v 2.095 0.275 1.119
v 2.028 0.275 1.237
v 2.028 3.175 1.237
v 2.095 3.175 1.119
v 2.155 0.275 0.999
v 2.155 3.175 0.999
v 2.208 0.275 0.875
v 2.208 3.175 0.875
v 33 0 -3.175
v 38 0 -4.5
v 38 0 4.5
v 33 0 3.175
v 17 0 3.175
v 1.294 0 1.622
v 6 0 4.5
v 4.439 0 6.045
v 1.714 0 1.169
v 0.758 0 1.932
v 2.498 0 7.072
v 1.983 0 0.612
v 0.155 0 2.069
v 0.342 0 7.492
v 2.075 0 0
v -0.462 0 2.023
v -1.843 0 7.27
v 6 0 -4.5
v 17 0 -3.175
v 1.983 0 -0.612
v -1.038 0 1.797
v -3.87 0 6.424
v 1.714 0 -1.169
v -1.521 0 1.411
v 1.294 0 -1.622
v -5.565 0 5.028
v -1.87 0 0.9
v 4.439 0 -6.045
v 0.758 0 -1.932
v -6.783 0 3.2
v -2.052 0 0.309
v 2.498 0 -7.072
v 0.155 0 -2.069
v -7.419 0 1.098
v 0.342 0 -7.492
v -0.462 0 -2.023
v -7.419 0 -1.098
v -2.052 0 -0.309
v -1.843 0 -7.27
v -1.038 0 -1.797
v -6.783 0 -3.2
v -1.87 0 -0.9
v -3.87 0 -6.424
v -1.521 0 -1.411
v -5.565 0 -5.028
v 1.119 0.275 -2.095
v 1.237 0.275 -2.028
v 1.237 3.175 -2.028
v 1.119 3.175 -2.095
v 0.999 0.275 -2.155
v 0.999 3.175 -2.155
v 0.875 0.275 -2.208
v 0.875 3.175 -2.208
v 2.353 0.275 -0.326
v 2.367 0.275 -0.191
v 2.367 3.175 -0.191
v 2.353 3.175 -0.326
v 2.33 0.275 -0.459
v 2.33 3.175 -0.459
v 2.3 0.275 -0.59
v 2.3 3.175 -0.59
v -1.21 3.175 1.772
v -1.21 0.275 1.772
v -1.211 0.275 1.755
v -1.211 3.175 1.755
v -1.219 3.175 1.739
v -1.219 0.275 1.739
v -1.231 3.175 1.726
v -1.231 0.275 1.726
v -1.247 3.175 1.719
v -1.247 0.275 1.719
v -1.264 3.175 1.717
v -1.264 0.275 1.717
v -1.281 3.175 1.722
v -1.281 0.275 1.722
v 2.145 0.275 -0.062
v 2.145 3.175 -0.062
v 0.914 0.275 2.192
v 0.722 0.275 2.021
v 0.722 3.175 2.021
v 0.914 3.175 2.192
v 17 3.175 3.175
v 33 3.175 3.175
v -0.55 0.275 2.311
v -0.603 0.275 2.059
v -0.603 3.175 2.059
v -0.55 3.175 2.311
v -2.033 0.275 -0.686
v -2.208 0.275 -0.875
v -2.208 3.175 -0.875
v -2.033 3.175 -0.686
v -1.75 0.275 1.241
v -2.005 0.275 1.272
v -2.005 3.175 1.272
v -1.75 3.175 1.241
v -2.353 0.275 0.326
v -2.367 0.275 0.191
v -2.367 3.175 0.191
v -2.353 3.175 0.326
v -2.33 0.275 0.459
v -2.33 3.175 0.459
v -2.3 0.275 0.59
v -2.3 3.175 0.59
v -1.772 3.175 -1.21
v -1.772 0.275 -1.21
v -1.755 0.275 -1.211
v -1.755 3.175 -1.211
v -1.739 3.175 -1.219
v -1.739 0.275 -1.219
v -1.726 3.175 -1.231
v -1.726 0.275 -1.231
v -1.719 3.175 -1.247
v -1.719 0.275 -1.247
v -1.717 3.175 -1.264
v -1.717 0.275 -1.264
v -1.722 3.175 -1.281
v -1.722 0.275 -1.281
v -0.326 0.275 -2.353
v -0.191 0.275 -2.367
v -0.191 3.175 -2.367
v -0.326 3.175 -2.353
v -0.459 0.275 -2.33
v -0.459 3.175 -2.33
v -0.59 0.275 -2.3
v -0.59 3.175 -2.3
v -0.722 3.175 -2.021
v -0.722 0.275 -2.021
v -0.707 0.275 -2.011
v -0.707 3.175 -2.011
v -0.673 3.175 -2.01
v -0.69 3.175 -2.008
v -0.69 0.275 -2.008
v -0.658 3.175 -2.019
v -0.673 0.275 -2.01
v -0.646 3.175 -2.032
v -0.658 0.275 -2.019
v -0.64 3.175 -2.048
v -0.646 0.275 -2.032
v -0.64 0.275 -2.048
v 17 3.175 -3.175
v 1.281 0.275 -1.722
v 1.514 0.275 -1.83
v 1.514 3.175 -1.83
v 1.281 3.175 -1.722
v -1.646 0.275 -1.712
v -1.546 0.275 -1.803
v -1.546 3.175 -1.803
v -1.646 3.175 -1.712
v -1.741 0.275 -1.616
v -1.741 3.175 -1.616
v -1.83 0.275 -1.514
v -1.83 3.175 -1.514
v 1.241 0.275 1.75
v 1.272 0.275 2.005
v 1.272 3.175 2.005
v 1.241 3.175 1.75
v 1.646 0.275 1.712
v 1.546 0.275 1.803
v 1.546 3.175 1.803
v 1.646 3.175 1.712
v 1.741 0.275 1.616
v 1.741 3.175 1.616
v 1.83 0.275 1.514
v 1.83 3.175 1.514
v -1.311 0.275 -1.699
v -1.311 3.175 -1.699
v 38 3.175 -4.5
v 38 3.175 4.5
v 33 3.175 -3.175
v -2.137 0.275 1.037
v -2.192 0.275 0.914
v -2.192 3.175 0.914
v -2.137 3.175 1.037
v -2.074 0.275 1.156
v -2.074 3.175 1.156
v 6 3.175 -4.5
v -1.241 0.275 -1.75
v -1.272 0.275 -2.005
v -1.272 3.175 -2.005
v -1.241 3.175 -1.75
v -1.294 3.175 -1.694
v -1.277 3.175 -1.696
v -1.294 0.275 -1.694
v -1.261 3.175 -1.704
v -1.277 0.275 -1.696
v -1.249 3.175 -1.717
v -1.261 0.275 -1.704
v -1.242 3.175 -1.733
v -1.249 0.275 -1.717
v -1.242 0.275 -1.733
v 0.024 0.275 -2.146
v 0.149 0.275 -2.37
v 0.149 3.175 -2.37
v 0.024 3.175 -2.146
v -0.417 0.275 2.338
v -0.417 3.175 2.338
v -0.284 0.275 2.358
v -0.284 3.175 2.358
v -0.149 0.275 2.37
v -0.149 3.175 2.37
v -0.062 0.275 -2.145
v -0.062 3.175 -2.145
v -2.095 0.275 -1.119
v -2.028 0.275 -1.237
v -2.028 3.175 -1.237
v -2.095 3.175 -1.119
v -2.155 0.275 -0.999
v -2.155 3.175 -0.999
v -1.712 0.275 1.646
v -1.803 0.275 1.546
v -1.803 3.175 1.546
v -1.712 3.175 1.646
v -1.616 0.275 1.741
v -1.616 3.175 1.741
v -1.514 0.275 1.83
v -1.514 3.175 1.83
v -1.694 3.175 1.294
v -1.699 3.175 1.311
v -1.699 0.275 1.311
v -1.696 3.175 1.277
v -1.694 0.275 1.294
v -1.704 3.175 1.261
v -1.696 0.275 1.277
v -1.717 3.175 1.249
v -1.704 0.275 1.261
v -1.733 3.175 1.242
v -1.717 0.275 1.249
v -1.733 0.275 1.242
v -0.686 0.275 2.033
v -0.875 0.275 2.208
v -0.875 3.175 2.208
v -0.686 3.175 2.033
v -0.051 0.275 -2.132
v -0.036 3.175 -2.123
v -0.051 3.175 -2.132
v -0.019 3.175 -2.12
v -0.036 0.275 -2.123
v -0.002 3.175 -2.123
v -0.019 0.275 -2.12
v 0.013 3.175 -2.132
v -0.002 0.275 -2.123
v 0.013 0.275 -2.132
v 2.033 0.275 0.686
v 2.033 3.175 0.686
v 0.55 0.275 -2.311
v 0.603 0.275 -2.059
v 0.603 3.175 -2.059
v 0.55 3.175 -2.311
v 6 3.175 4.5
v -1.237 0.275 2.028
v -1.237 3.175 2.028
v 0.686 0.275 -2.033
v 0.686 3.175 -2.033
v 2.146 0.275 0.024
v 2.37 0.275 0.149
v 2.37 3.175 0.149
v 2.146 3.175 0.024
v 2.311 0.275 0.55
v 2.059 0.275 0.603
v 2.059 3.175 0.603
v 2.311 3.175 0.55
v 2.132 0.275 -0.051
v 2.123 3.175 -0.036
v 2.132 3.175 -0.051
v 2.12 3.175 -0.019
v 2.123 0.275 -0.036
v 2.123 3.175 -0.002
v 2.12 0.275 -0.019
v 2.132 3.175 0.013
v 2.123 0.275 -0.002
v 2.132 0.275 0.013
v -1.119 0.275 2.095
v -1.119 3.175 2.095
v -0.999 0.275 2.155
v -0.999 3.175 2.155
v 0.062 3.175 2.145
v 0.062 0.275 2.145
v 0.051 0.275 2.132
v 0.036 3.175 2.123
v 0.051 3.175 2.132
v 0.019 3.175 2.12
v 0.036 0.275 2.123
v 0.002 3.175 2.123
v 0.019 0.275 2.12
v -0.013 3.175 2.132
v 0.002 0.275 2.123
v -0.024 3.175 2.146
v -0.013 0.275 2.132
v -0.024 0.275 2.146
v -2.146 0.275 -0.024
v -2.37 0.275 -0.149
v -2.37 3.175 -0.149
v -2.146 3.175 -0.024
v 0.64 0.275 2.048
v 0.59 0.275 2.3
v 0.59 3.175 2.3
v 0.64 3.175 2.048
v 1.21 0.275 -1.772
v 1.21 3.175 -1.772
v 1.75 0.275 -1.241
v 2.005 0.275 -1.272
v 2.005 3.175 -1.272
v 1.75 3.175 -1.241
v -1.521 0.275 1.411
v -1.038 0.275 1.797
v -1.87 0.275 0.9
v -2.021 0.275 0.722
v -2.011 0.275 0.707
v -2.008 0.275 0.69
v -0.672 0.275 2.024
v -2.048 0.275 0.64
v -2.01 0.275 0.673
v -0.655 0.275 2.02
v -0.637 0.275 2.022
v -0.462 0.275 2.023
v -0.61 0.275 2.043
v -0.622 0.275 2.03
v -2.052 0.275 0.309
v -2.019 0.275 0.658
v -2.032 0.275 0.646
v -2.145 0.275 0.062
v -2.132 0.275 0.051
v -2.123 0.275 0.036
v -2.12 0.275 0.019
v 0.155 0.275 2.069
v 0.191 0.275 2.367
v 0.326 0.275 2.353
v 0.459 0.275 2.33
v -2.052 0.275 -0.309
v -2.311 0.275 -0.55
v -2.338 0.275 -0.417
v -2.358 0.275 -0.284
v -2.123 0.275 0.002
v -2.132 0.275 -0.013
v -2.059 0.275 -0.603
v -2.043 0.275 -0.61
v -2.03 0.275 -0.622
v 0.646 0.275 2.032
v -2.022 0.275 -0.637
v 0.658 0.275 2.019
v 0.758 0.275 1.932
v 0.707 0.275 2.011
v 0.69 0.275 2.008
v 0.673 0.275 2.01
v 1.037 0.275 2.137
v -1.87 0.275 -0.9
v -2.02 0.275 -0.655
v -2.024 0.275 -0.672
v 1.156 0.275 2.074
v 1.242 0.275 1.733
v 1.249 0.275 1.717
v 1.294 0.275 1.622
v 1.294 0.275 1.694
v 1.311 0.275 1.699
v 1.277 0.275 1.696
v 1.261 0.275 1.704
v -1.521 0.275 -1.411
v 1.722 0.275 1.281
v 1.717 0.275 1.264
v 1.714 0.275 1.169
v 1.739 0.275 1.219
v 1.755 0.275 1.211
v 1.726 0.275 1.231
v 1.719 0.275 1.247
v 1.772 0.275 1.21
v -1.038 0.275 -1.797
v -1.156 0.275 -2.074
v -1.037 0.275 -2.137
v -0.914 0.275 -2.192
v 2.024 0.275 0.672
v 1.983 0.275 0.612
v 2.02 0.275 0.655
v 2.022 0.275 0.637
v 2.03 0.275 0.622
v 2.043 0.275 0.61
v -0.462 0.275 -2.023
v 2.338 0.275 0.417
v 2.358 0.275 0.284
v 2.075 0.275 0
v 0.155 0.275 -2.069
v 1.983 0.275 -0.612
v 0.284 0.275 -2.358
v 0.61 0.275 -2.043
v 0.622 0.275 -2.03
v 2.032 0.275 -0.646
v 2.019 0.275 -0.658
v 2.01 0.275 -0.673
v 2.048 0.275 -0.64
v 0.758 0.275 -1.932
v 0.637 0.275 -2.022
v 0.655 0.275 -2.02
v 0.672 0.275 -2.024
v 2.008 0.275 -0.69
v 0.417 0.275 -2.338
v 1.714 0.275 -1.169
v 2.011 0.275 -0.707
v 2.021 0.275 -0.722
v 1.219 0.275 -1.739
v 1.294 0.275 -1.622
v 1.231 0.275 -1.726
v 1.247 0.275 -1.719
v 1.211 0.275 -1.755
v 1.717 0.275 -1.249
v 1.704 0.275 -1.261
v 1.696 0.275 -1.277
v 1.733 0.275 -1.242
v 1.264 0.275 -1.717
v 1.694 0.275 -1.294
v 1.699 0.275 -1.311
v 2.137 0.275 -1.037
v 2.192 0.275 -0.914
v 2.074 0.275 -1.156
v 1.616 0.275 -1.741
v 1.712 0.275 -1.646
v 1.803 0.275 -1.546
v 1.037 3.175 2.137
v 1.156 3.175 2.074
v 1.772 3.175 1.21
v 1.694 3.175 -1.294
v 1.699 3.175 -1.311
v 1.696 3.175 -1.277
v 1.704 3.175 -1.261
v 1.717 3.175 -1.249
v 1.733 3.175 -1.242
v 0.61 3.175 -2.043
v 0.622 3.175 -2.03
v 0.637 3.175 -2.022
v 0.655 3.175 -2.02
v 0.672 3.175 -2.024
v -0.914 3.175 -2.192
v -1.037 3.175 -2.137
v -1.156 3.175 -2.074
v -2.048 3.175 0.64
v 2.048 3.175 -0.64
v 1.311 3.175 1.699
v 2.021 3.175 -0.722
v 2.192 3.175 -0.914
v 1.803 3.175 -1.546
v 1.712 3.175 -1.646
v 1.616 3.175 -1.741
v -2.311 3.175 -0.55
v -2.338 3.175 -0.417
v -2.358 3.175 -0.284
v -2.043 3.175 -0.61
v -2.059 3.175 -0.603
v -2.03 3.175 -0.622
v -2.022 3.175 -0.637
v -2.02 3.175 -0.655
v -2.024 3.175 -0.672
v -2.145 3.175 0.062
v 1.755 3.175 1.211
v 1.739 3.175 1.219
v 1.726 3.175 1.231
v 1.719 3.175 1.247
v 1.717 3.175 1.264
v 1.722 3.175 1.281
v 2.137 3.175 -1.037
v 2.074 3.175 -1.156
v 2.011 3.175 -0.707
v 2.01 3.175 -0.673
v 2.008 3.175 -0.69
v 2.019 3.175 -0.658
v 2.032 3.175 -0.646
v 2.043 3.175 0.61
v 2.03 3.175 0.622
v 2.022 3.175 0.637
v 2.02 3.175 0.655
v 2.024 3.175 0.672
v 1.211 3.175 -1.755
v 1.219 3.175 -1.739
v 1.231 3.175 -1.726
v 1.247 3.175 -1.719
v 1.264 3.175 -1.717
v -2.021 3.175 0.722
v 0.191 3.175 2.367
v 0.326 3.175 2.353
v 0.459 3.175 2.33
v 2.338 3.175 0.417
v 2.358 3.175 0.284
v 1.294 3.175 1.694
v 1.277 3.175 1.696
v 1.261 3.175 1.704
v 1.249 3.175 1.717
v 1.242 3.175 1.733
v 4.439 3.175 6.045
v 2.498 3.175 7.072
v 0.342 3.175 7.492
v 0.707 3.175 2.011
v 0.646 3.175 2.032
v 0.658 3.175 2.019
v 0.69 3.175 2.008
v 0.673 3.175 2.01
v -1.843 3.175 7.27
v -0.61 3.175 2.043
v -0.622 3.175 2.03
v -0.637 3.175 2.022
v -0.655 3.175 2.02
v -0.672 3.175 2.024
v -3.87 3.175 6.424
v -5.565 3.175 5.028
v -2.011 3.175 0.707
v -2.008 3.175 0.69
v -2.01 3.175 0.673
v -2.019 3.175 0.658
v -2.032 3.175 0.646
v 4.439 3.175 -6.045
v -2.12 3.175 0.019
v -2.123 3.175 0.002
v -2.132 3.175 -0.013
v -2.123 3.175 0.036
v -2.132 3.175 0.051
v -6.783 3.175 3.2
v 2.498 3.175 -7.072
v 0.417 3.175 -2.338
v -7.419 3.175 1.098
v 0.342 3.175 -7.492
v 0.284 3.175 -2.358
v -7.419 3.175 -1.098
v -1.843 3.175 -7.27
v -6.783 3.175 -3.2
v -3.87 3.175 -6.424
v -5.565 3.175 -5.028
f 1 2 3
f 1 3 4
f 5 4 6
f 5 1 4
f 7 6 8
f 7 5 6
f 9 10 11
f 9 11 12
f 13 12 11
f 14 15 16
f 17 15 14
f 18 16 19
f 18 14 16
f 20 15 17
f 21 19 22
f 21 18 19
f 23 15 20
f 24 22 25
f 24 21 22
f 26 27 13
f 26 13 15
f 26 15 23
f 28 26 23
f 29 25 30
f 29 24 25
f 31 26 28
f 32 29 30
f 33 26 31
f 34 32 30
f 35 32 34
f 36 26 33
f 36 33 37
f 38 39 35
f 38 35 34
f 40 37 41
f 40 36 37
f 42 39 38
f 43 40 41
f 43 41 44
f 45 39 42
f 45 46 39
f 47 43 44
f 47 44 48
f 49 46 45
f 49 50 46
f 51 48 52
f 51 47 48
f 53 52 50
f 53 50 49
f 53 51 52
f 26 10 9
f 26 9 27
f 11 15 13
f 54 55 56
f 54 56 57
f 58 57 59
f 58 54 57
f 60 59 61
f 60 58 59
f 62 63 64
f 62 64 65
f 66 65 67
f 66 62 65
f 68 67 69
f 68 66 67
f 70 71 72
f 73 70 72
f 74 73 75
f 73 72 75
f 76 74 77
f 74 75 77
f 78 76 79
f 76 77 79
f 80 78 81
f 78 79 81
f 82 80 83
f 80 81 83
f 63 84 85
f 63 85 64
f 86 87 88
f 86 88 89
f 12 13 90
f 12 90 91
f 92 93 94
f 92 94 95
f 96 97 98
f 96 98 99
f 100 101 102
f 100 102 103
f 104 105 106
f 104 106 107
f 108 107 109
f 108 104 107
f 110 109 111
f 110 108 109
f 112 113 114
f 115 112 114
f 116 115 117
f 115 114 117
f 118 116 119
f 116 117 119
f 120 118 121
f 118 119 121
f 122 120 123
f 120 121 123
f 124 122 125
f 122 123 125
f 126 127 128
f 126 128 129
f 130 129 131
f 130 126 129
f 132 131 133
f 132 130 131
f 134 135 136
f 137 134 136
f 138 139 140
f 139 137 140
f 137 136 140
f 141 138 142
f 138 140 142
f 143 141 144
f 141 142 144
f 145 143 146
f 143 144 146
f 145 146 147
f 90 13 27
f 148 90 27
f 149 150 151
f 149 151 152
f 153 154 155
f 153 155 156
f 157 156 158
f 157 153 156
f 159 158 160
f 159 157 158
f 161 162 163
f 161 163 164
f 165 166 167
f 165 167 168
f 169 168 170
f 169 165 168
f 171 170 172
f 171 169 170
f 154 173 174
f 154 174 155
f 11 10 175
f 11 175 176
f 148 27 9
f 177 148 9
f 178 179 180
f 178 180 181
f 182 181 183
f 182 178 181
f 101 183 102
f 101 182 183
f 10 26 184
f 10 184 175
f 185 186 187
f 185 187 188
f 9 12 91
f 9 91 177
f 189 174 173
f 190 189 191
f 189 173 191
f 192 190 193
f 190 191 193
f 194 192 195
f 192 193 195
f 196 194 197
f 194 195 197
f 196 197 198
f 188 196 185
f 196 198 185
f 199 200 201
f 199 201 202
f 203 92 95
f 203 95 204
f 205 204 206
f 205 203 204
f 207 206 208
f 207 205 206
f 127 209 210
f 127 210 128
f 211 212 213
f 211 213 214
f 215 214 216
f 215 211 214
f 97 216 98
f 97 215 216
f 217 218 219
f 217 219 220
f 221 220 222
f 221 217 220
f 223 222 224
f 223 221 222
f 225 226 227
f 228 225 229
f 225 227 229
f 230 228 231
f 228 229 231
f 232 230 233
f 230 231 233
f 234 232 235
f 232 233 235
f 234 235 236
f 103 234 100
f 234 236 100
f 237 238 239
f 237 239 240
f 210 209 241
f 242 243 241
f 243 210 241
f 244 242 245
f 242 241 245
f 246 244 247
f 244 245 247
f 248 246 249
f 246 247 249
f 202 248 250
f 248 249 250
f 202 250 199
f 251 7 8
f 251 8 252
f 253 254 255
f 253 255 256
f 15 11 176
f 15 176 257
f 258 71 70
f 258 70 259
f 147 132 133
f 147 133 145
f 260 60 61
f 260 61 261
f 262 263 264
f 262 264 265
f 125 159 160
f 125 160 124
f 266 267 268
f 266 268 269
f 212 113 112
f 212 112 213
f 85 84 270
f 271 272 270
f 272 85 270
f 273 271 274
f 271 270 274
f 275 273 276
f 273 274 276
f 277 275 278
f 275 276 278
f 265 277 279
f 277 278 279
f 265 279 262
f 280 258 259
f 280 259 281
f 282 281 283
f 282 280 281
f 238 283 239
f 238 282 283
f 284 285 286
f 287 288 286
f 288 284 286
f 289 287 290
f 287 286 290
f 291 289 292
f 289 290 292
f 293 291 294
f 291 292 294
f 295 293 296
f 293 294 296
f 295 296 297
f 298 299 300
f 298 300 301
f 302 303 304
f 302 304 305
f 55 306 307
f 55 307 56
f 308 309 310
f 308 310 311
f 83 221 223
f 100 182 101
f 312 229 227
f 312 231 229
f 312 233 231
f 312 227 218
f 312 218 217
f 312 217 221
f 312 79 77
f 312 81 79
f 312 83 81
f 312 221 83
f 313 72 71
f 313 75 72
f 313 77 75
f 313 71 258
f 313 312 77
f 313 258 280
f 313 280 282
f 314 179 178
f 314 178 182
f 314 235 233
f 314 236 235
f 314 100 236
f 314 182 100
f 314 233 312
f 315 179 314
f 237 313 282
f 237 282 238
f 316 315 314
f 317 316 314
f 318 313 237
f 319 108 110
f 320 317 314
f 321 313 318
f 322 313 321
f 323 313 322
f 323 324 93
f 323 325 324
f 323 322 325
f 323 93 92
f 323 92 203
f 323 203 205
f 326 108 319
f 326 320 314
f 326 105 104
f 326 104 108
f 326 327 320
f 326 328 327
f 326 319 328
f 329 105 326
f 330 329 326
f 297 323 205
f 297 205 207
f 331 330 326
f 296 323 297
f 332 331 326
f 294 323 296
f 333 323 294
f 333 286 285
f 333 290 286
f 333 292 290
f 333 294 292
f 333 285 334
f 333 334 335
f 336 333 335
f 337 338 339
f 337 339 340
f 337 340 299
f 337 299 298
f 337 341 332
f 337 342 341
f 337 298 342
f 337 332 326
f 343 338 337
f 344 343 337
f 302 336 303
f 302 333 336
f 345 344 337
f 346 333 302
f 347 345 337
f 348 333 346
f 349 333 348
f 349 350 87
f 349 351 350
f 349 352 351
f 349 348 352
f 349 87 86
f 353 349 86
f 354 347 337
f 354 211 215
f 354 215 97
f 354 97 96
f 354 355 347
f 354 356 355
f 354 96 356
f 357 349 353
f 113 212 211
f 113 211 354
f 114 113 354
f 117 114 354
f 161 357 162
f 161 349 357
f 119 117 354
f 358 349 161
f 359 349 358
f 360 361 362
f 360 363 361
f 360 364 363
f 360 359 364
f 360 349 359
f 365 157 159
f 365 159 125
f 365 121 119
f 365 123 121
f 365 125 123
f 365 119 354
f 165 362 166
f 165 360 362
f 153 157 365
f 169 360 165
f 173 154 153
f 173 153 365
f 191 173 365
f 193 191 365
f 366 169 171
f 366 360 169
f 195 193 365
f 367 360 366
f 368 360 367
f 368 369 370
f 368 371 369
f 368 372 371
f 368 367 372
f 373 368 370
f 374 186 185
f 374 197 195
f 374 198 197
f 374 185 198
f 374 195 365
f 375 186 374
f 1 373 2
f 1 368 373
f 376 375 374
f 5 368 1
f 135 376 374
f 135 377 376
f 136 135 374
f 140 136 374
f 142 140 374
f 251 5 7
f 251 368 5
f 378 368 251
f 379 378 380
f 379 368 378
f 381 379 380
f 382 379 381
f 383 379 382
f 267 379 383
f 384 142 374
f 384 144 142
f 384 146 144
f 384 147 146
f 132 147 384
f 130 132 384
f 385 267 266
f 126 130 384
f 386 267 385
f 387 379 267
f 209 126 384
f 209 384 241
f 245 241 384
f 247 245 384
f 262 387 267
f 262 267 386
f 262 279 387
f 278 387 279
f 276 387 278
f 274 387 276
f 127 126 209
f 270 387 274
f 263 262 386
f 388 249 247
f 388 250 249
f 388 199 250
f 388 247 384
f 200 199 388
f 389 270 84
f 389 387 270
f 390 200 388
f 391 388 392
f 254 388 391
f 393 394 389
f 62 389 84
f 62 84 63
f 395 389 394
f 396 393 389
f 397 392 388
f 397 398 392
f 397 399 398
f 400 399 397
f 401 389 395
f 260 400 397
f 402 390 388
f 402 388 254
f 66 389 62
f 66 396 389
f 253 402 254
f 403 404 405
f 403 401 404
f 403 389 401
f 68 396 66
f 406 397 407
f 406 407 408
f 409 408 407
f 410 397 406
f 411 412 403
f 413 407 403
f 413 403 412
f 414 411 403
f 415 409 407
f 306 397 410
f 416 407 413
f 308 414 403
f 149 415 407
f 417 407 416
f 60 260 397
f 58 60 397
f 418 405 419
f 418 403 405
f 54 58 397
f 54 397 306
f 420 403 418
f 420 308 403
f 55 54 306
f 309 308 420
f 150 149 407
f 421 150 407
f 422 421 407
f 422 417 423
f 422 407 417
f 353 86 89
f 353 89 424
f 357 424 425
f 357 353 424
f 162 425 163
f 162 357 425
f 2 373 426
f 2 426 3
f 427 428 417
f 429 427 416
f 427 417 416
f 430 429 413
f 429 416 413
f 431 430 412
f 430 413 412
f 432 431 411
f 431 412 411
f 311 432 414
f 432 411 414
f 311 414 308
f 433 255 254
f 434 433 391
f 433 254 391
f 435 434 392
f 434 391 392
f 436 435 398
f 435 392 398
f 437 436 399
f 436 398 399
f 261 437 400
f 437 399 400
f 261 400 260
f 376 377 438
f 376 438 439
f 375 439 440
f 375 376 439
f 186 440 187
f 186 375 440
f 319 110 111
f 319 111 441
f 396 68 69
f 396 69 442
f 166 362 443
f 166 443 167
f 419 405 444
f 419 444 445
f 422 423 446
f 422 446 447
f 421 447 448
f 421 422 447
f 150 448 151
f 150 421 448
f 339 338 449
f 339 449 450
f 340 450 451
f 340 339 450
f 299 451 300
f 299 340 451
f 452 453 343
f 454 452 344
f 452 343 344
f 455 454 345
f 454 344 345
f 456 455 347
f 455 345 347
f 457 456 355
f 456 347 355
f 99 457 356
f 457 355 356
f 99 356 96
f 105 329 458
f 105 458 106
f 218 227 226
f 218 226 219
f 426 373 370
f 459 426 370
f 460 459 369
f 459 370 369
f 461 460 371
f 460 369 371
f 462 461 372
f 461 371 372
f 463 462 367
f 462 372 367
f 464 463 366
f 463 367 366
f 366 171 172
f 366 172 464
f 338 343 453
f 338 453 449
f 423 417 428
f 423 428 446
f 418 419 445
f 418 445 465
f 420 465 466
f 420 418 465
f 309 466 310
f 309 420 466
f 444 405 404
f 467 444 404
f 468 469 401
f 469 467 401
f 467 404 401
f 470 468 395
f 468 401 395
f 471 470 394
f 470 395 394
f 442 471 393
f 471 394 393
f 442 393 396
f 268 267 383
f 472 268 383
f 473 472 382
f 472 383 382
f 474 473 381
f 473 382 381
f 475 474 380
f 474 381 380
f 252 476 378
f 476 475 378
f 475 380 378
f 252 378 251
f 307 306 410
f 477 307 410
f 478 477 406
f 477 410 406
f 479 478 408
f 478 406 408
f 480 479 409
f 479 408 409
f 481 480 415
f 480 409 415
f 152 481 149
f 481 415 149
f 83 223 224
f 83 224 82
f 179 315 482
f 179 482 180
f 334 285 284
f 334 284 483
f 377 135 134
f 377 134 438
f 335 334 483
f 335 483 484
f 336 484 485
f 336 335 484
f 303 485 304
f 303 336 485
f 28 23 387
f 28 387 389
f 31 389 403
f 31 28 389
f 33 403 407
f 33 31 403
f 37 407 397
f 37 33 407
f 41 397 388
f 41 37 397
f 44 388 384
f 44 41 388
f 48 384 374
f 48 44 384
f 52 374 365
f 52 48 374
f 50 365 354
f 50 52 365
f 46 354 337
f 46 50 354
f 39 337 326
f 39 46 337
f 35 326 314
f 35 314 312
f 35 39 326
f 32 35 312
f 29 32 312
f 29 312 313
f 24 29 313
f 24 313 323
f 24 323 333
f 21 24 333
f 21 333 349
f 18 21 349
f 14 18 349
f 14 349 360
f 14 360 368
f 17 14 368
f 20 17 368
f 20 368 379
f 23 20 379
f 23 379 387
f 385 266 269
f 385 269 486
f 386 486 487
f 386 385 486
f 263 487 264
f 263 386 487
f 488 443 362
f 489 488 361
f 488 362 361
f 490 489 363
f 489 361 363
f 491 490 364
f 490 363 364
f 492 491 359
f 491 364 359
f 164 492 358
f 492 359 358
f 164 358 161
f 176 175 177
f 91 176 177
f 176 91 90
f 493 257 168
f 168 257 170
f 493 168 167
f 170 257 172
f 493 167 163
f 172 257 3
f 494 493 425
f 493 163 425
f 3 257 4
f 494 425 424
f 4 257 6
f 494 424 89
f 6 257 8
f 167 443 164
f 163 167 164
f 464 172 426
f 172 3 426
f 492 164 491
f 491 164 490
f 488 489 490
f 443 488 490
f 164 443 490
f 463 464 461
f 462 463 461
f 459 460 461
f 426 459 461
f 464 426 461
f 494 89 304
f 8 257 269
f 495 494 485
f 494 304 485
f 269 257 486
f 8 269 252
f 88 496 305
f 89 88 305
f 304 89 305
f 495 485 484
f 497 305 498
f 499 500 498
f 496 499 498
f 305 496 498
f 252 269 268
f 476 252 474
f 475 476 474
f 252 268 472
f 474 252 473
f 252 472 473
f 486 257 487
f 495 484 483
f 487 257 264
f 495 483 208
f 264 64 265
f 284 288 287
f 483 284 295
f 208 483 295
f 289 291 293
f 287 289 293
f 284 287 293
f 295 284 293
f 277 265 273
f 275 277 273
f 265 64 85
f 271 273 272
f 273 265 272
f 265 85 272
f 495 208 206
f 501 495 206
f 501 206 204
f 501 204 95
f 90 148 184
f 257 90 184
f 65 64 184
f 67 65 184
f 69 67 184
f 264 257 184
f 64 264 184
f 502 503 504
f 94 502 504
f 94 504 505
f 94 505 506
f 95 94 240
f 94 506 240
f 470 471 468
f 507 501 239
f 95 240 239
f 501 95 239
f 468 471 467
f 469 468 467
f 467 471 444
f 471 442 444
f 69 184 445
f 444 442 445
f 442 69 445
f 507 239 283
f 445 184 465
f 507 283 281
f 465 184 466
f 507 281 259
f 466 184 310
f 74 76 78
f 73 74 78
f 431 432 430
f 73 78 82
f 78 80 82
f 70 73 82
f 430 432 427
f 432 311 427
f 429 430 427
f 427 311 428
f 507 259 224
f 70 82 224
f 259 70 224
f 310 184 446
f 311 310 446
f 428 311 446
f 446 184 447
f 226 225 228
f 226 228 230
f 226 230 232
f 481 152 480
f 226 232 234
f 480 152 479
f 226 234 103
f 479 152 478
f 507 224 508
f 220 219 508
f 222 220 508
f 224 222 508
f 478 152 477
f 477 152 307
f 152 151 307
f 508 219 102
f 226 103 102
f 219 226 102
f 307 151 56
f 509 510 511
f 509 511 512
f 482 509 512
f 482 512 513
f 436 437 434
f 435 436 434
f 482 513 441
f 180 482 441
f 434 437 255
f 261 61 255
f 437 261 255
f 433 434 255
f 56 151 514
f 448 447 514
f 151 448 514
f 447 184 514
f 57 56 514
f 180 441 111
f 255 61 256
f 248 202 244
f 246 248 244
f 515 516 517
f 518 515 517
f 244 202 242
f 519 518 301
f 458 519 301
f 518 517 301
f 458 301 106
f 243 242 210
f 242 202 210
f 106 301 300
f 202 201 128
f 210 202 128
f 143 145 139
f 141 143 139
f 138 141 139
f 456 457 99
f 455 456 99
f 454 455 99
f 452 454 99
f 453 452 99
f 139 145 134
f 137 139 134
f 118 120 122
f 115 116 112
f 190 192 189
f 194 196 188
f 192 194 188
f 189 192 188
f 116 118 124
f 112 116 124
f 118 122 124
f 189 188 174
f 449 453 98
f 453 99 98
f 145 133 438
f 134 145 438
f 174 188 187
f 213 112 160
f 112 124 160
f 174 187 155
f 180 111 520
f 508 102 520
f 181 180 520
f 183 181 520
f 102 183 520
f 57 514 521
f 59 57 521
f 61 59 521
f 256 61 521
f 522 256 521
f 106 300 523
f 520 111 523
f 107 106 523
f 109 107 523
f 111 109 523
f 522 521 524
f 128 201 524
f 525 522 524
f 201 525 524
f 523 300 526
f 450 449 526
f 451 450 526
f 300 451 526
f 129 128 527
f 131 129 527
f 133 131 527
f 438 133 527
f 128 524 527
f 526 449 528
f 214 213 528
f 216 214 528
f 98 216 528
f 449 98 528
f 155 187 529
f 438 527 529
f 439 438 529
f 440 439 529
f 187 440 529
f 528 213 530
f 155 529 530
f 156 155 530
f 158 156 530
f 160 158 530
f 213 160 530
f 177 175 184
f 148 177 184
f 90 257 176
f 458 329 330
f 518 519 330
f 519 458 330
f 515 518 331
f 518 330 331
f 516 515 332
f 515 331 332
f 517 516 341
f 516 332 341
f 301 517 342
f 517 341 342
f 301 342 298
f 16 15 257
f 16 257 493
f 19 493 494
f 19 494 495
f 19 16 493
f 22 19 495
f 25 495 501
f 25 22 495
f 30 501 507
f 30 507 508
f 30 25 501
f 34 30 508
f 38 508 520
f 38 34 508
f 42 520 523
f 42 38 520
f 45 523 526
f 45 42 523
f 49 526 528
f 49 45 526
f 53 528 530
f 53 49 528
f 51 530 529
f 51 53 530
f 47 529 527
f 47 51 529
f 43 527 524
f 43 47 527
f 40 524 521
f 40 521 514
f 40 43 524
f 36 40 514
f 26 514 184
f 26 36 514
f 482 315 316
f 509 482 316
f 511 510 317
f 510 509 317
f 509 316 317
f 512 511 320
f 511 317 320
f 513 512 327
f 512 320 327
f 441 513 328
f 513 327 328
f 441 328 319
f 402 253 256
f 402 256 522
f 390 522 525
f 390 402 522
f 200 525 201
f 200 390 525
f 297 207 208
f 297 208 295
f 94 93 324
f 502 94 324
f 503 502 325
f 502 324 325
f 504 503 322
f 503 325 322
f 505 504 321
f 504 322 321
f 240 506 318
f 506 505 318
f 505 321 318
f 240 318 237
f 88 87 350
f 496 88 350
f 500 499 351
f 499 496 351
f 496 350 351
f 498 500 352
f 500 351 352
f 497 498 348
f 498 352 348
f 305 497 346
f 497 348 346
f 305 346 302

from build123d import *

# Parameters (mm, degrees)
SKETCH1_R             = 2
SKETCH1_W             = 16
SKETCH1_H             = 6.35
BOSS_EXTRUDE1_DEPTH   = 3.175
INDENT2_START         = 0.275
INDENT2_OUTLINE_R     = 2
INDENT2_DEPTH         = 2.9
INDENT2_2_OUTLINE_R   = 2.075
INDENT2_2_OUTLINE_R_2 = 2
INDENT2_2_DEPTH       = 0.275
FILLET4_R             = 0.05


# Read off the part's stored shape, not the designer's step: Indent2
with BuildPart() as part:
    # Sketch1 → Boss-Extrude1 (new body)
    with BuildSketch(Plane(origin=(0, 0, 0), x_dir=(1, 0, 0), z_dir=(0, 1, 0))):
        with BuildLine():
            Line((6, 4.5), (38, 4.5))
            Line((38, 4.5), (38, -4.5))
            Line((38, -4.5), (6, -4.5))
            ThreePointArc((6, -4.5), (-7.5, 0), (6, 4.5))
        make_face()
        with Locations(Location((0, 0, 0), (0, 0, 270))):
            Circle(SKETCH1_R, mode=Mode.SUBTRACT)
        with Locations((25, 0)):
            Rectangle(SKETCH1_W, SKETCH1_H, mode=Mode.SUBTRACT)
    extrude(amount=BOSS_EXTRUDE1_DEPTH)

    # Indent2 outline → Indent2 (cut)
    with BuildSketch(Plane(origin=(0, 0, 0), x_dir=(1, 0, 0), z_dir=(0, 1, 0)).offset(INDENT2_START)):
        with BuildLine():
            Line((1.973202198, -0.621873827), (2.310555802, -0.549506038))
            ThreePointArc((2.310555802, -0.549506038), (2.348957068, -0.350750187), (2.370293408, -0.149446173))
            Line((2.370293408, -0.149446173), (2.068796389, 0.018315857))
            Line((2.068796389, 0.018315857), (2.367275856, 0.191389711))
            ThreePointArc((2.367275856, 0.191389711), (2.342378694, 0.392284402), (2.300464399, 0.590329188))
            Line((2.300464399, 0.590329188), (1.961882375, 0.656712657))
            Line((1.961882375, 0.656712657), (2.192270455, 0.913550902))
            ThreePointArc((2.192270455, 0.913550902), (2.106511974, 1.096919461), (2.005449906, 1.272319015))
            Line((2.005449906, 1.272319015), (1.662925646, 1.230825847))
            Line((1.662925646, 1.230825847), (1.802670348, 1.546287365))
            ThreePointArc((1.802670348, 1.546287365), (1.664445185, 1.6941804), (1.514128003, 1.829765392))
            Line((1.514128003, 1.829765392), (1.201190168, 1.684457227))
            Line((1.201190168, 1.684457227), (1.236612307, 2.027662448))
            ThreePointArc((1.236612307, 2.027662448), (1.059450904, 2.125603157), (0.874592702, 2.208101584))
            Line((0.874592702, 2.208101584), (0.621873827, 1.973202197))
            Line((0.621873827, 1.973202197), (0.549506038, 2.310555802))
            ThreePointArc((0.549506038, 2.310555802), (0.350750187, 2.348957068), (0.149446173, 2.370293408))
            Line((0.149446173, 2.370293408), (-0.018315857, 2.068796389))
            Line((-0.018315857, 2.068796389), (-0.191389711, 2.367275856))
            ThreePointArc((-0.191389711, 2.367275856), (-0.392284402, 2.342378694), (-0.590329188, 2.300464399))
            Line((-0.590329188, 2.300464399), (-0.656712657, 1.961882375))
            Line((-0.656712657, 1.961882375), (-0.913550902, 2.192270455))
            ThreePointArc((-0.913550902, 2.192270455), (-1.096919461, 2.106511974), (-1.272319015, 2.005449905))
            Line((-1.272319015, 2.005449905), (-1.230825847, 1.662925646))
            Line((-1.230825847, 1.662925646), (-1.546287365, 1.802670348))
            ThreePointArc((-1.546287365, 1.802670348), (-1.6941804, 1.664445185), (-1.829765392, 1.514128003))
            Line((-1.829765392, 1.514128003), (-1.684457227, 1.201190168))
            Line((-1.684457227, 1.201190168), (-2.027662448, 1.236612307))
            ThreePointArc((-2.027662448, 1.236612307), (-2.125603157, 1.059450904), (-2.208101584, 0.874592702))
            Line((-2.208101584, 0.874592702), (-1.973202197, 0.621873827))
            Line((-1.973202197, 0.621873827), (-2.310555802, 0.549506038))
            ThreePointArc((-2.310555802, 0.549506038), (-2.348957068, 0.350750187), (-2.370293408, 0.149446173))
            Line((-2.370293408, 0.149446173), (-2.068796389, -0.018315857))
            Line((-2.068796389, -0.018315857), (-2.367275856, -0.191389711))
            ThreePointArc((-2.367275856, -0.191389711), (-2.342378694, -0.392284402), (-2.300464399, -0.590329188))
            Line((-2.300464399, -0.590329188), (-1.961882375, -0.656712657))
            Line((-1.961882375, -0.656712657), (-2.192270455, -0.913550902))
            ThreePointArc((-2.192270455, -0.913550902), (-2.106511974, -1.096919461), (-2.005449905, -1.272319015))
            Line((-2.005449905, -1.272319015), (-1.662925646, -1.230825847))
            Line((-1.662925646, -1.230825847), (-1.802670348, -1.546287365))
            ThreePointArc((-1.802670348, -1.546287365), (-1.664445185, -1.6941804), (-1.514128003, -1.829765392))
            Line((-1.514128003, -1.829765392), (-1.201190168, -1.684457227))
            Line((-1.201190168, -1.684457227), (-1.236612307, -2.027662448))
            ThreePointArc((-1.236612307, -2.027662448), (-1.059450904, -2.125603157), (-0.874592702, -2.208101584))
            Line((-0.874592702, -2.208101584), (-0.621873827, -1.973202198))
            Line((-0.621873827, -1.973202198), (-0.549506038, -2.310555802))
            ThreePointArc((-0.549506038, -2.310555802), (-0.350750187, -2.348957068), (-0.149446173, -2.370293408))
            Line((-0.149446173, -2.370293408), (0.018315857, -2.068796389))
            Line((0.018315857, -2.068796389), (0.191389711, -2.367275856))
            ThreePointArc((0.191389711, -2.367275856), (0.392284402, -2.342378694), (0.590329188, -2.300464399))
            Line((0.590329188, -2.300464399), (0.656712657, -1.961882375))
            Line((0.656712657, -1.961882375), (0.913550902, -2.192270455))
            ThreePointArc((0.913550902, -2.192270455), (1.096919461, -2.106511974), (1.272319015, -2.005449906))
            Line((1.272319015, -2.005449906), (1.230825847, -1.662925646))
            Line((1.230825847, -1.662925646), (1.546287365, -1.802670348))
            ThreePointArc((1.546287365, -1.802670348), (1.6941804, -1.664445185), (1.829765392, -1.514128003))
            Line((1.829765392, -1.514128003), (1.684457227, -1.201190168))
            Line((1.684457227, -1.201190168), (2.027662448, -1.236612307))
            ThreePointArc((2.027662448, -1.236612307), (2.125603157, -1.059450904), (2.208101584, -0.874592702))
            Line((2.208101584, -0.874592702), (1.973202198, -0.621873827))
        make_face()
        Circle(INDENT2_OUTLINE_R, mode=Mode.SUBTRACT)
    extrude(amount=INDENT2_DEPTH, mode=Mode.SUBTRACT)

    # Indent2 2 outline → Indent2 2 (cut)
    with BuildSketch(Plane(origin=(0, 0, 0), x_dir=(1, 0, 0), z_dir=(0, 1, 0))):
        Circle(INDENT2_2_OUTLINE_R)
        Circle(INDENT2_2_OUTLINE_R_2, mode=Mode.SUBTRACT)
    extrude(amount=INDENT2_2_DEPTH, mode=Mode.SUBTRACT)

    # Fillet4
    # the kernel refuses this fillet: 0.05 mm, written as the material it takes off along each edge
    with BuildSketch(Plane(origin=(2.068796389, 0.275, -0.018315857), x_dir=(0.8650868282896619, 0, -0.501622148155096), z_dir=(0, 1, 0)), Plane(origin=(1.961882375, 0.275, -0.656712657), x_dir=(0.6677366959947866, 0, -0.7443975448790559), z_dir=(0, 1, 0)), Plane(origin=(0.621873827, 0.275, -1.973202197), x_dir=(-0.20974448107145283, 0, -0.9777562337618038), z_dir=(0, 1, 0)), Plane(origin=(-0.018315857, 0.275, -2.068796389), x_dir=(-0.501622148155096, 0, -0.8650868282896619), z_dir=(0, 1, 0)), Plane(origin=(-0.656712657, 0.275, -1.961882375), x_dir=(-0.7443975448790559, 0, -0.6677366959947866), z_dir=(0, 1, 0)), Plane(origin=(-1.973202197, 0.275, -0.621873827), x_dir=(-0.9777562337618038, 0, 0.20974448107145283), z_dir=(0, 1, 0)), Plane(origin=(-2.068796389, 0.275, 0.018315857), x_dir=(-0.8650868282896619, 0, 0.501622148155096), z_dir=(0, 1, 0)), Plane(origin=(-1.961882375, 0.275, 0.656712657), x_dir=(-0.6677366959947866, 0, 0.7443975448790559), z_dir=(0, 1, 0)), Plane(origin=(0.018315857, 0.275, 2.068796389), x_dir=(0.501622148155096, 0, 0.8650868282896619), z_dir=(0, 1, 0)), Plane(origin=(0.656712657, 0.275, 1.961882375), x_dir=(0.7443975448790559, 0, 0.6677366959947866), z_dir=(0, 1, 0))) as fillet4_piece_1:
        with BuildLine():
            CenterArc((FILLET4_R * 1.76030903483, -FILLET4_R), FILLET4_R, 90, 120.799739684)
            Line((FILLET4_R * 0.901346811508, -FILLET4_R * 1.51203896229), (0, 0))
            Line((0, 0), (FILLET4_R * 1.76030903483, 0))
        make_face()
    extrude(amount=3.120038629, mode=Mode.SUBTRACT)
    with BuildSketch(Plane(origin=(1.662925646, 0.275, -1.230825847), x_dir=(0.40502384395389723, 0, -0.9143061226027139), z_dir=(0, 1, 0)), Plane(origin=(-1.230825847, 0.275, -1.662925646), x_dir=(-0.9143061226027142, 0, -0.40502384395389696), z_dir=(0, 1, 0)), Plane(origin=(-1.662925646, 0.275, 1.230825847), x_dir=(-0.40502384395389696, 0, 0.9143061226027142), z_dir=(0, 1, 0)), Plane(origin=(-0.621873827, 0.275, 1.973202198), x_dir=(0.20974448166583565, 0, 0.977756233634299), z_dir=(0, 1, 0)), Plane(origin=(1.230825847, 0.275, 1.662925646), x_dir=(0.9143061226027139, 0, 0.40502384395389723), z_dir=(0, 1, 0)), Plane(origin=(1.973202198, 0.275, 0.621873827), x_dir=(0.977756233634299, 0, -0.20974448166583565), z_dir=(0, 1, 0))) as fillet4_piece_2:
        with BuildLine():
            CenterArc((FILLET4_R * 1.76030903185, -FILLET4_R), FILLET4_R, 90, 120.799739601)
            Line((FILLET4_R * 0.901346807787, -FILLET4_R * 1.51203896104), (0, 0))
            Line((0, 0), (FILLET4_R * 1.76030903185, 0))
        make_face()
    extrude(amount=3.120038629, mode=Mode.SUBTRACT)
    with BuildSketch(Plane(origin=(1.201190168, 0.275, -1.684457227), x_dir=(0.10266443492130879, 0, -0.9947160468205429), z_dir=(0, 1, 0)), Plane(origin=(-1.684457227, 0.275, -1.201190168), x_dir=(-0.9947160468205429, 0, -0.10266443492130879), z_dir=(0, 1, 0)), Plane(origin=(-1.201190168, 0.275, 1.684457227), x_dir=(-0.10266443492130879, 0, 0.9947160468205429), z_dir=(0, 1, 0)), Plane(origin=(1.684457227, 0.275, 1.201190168), x_dir=(0.9947160468205429, 0, 0.10266443492130879), z_dir=(0, 1, 0))) as fillet4_piece_3:
        with BuildLine():
            CenterArc((FILLET4_R * 1.7603090297, -FILLET4_R), FILLET4_R, 90, 120.799739541)
            Line((FILLET4_R * 0.901346805096, -FILLET4_R * 1.51203896014), (0, 0))
            Line((0, 0), (FILLET4_R * 1.7603090297, 0))
        make_face()
    extrude(amount=3.120038629, mode=Mode.SUBTRACT)


solid = part.part
